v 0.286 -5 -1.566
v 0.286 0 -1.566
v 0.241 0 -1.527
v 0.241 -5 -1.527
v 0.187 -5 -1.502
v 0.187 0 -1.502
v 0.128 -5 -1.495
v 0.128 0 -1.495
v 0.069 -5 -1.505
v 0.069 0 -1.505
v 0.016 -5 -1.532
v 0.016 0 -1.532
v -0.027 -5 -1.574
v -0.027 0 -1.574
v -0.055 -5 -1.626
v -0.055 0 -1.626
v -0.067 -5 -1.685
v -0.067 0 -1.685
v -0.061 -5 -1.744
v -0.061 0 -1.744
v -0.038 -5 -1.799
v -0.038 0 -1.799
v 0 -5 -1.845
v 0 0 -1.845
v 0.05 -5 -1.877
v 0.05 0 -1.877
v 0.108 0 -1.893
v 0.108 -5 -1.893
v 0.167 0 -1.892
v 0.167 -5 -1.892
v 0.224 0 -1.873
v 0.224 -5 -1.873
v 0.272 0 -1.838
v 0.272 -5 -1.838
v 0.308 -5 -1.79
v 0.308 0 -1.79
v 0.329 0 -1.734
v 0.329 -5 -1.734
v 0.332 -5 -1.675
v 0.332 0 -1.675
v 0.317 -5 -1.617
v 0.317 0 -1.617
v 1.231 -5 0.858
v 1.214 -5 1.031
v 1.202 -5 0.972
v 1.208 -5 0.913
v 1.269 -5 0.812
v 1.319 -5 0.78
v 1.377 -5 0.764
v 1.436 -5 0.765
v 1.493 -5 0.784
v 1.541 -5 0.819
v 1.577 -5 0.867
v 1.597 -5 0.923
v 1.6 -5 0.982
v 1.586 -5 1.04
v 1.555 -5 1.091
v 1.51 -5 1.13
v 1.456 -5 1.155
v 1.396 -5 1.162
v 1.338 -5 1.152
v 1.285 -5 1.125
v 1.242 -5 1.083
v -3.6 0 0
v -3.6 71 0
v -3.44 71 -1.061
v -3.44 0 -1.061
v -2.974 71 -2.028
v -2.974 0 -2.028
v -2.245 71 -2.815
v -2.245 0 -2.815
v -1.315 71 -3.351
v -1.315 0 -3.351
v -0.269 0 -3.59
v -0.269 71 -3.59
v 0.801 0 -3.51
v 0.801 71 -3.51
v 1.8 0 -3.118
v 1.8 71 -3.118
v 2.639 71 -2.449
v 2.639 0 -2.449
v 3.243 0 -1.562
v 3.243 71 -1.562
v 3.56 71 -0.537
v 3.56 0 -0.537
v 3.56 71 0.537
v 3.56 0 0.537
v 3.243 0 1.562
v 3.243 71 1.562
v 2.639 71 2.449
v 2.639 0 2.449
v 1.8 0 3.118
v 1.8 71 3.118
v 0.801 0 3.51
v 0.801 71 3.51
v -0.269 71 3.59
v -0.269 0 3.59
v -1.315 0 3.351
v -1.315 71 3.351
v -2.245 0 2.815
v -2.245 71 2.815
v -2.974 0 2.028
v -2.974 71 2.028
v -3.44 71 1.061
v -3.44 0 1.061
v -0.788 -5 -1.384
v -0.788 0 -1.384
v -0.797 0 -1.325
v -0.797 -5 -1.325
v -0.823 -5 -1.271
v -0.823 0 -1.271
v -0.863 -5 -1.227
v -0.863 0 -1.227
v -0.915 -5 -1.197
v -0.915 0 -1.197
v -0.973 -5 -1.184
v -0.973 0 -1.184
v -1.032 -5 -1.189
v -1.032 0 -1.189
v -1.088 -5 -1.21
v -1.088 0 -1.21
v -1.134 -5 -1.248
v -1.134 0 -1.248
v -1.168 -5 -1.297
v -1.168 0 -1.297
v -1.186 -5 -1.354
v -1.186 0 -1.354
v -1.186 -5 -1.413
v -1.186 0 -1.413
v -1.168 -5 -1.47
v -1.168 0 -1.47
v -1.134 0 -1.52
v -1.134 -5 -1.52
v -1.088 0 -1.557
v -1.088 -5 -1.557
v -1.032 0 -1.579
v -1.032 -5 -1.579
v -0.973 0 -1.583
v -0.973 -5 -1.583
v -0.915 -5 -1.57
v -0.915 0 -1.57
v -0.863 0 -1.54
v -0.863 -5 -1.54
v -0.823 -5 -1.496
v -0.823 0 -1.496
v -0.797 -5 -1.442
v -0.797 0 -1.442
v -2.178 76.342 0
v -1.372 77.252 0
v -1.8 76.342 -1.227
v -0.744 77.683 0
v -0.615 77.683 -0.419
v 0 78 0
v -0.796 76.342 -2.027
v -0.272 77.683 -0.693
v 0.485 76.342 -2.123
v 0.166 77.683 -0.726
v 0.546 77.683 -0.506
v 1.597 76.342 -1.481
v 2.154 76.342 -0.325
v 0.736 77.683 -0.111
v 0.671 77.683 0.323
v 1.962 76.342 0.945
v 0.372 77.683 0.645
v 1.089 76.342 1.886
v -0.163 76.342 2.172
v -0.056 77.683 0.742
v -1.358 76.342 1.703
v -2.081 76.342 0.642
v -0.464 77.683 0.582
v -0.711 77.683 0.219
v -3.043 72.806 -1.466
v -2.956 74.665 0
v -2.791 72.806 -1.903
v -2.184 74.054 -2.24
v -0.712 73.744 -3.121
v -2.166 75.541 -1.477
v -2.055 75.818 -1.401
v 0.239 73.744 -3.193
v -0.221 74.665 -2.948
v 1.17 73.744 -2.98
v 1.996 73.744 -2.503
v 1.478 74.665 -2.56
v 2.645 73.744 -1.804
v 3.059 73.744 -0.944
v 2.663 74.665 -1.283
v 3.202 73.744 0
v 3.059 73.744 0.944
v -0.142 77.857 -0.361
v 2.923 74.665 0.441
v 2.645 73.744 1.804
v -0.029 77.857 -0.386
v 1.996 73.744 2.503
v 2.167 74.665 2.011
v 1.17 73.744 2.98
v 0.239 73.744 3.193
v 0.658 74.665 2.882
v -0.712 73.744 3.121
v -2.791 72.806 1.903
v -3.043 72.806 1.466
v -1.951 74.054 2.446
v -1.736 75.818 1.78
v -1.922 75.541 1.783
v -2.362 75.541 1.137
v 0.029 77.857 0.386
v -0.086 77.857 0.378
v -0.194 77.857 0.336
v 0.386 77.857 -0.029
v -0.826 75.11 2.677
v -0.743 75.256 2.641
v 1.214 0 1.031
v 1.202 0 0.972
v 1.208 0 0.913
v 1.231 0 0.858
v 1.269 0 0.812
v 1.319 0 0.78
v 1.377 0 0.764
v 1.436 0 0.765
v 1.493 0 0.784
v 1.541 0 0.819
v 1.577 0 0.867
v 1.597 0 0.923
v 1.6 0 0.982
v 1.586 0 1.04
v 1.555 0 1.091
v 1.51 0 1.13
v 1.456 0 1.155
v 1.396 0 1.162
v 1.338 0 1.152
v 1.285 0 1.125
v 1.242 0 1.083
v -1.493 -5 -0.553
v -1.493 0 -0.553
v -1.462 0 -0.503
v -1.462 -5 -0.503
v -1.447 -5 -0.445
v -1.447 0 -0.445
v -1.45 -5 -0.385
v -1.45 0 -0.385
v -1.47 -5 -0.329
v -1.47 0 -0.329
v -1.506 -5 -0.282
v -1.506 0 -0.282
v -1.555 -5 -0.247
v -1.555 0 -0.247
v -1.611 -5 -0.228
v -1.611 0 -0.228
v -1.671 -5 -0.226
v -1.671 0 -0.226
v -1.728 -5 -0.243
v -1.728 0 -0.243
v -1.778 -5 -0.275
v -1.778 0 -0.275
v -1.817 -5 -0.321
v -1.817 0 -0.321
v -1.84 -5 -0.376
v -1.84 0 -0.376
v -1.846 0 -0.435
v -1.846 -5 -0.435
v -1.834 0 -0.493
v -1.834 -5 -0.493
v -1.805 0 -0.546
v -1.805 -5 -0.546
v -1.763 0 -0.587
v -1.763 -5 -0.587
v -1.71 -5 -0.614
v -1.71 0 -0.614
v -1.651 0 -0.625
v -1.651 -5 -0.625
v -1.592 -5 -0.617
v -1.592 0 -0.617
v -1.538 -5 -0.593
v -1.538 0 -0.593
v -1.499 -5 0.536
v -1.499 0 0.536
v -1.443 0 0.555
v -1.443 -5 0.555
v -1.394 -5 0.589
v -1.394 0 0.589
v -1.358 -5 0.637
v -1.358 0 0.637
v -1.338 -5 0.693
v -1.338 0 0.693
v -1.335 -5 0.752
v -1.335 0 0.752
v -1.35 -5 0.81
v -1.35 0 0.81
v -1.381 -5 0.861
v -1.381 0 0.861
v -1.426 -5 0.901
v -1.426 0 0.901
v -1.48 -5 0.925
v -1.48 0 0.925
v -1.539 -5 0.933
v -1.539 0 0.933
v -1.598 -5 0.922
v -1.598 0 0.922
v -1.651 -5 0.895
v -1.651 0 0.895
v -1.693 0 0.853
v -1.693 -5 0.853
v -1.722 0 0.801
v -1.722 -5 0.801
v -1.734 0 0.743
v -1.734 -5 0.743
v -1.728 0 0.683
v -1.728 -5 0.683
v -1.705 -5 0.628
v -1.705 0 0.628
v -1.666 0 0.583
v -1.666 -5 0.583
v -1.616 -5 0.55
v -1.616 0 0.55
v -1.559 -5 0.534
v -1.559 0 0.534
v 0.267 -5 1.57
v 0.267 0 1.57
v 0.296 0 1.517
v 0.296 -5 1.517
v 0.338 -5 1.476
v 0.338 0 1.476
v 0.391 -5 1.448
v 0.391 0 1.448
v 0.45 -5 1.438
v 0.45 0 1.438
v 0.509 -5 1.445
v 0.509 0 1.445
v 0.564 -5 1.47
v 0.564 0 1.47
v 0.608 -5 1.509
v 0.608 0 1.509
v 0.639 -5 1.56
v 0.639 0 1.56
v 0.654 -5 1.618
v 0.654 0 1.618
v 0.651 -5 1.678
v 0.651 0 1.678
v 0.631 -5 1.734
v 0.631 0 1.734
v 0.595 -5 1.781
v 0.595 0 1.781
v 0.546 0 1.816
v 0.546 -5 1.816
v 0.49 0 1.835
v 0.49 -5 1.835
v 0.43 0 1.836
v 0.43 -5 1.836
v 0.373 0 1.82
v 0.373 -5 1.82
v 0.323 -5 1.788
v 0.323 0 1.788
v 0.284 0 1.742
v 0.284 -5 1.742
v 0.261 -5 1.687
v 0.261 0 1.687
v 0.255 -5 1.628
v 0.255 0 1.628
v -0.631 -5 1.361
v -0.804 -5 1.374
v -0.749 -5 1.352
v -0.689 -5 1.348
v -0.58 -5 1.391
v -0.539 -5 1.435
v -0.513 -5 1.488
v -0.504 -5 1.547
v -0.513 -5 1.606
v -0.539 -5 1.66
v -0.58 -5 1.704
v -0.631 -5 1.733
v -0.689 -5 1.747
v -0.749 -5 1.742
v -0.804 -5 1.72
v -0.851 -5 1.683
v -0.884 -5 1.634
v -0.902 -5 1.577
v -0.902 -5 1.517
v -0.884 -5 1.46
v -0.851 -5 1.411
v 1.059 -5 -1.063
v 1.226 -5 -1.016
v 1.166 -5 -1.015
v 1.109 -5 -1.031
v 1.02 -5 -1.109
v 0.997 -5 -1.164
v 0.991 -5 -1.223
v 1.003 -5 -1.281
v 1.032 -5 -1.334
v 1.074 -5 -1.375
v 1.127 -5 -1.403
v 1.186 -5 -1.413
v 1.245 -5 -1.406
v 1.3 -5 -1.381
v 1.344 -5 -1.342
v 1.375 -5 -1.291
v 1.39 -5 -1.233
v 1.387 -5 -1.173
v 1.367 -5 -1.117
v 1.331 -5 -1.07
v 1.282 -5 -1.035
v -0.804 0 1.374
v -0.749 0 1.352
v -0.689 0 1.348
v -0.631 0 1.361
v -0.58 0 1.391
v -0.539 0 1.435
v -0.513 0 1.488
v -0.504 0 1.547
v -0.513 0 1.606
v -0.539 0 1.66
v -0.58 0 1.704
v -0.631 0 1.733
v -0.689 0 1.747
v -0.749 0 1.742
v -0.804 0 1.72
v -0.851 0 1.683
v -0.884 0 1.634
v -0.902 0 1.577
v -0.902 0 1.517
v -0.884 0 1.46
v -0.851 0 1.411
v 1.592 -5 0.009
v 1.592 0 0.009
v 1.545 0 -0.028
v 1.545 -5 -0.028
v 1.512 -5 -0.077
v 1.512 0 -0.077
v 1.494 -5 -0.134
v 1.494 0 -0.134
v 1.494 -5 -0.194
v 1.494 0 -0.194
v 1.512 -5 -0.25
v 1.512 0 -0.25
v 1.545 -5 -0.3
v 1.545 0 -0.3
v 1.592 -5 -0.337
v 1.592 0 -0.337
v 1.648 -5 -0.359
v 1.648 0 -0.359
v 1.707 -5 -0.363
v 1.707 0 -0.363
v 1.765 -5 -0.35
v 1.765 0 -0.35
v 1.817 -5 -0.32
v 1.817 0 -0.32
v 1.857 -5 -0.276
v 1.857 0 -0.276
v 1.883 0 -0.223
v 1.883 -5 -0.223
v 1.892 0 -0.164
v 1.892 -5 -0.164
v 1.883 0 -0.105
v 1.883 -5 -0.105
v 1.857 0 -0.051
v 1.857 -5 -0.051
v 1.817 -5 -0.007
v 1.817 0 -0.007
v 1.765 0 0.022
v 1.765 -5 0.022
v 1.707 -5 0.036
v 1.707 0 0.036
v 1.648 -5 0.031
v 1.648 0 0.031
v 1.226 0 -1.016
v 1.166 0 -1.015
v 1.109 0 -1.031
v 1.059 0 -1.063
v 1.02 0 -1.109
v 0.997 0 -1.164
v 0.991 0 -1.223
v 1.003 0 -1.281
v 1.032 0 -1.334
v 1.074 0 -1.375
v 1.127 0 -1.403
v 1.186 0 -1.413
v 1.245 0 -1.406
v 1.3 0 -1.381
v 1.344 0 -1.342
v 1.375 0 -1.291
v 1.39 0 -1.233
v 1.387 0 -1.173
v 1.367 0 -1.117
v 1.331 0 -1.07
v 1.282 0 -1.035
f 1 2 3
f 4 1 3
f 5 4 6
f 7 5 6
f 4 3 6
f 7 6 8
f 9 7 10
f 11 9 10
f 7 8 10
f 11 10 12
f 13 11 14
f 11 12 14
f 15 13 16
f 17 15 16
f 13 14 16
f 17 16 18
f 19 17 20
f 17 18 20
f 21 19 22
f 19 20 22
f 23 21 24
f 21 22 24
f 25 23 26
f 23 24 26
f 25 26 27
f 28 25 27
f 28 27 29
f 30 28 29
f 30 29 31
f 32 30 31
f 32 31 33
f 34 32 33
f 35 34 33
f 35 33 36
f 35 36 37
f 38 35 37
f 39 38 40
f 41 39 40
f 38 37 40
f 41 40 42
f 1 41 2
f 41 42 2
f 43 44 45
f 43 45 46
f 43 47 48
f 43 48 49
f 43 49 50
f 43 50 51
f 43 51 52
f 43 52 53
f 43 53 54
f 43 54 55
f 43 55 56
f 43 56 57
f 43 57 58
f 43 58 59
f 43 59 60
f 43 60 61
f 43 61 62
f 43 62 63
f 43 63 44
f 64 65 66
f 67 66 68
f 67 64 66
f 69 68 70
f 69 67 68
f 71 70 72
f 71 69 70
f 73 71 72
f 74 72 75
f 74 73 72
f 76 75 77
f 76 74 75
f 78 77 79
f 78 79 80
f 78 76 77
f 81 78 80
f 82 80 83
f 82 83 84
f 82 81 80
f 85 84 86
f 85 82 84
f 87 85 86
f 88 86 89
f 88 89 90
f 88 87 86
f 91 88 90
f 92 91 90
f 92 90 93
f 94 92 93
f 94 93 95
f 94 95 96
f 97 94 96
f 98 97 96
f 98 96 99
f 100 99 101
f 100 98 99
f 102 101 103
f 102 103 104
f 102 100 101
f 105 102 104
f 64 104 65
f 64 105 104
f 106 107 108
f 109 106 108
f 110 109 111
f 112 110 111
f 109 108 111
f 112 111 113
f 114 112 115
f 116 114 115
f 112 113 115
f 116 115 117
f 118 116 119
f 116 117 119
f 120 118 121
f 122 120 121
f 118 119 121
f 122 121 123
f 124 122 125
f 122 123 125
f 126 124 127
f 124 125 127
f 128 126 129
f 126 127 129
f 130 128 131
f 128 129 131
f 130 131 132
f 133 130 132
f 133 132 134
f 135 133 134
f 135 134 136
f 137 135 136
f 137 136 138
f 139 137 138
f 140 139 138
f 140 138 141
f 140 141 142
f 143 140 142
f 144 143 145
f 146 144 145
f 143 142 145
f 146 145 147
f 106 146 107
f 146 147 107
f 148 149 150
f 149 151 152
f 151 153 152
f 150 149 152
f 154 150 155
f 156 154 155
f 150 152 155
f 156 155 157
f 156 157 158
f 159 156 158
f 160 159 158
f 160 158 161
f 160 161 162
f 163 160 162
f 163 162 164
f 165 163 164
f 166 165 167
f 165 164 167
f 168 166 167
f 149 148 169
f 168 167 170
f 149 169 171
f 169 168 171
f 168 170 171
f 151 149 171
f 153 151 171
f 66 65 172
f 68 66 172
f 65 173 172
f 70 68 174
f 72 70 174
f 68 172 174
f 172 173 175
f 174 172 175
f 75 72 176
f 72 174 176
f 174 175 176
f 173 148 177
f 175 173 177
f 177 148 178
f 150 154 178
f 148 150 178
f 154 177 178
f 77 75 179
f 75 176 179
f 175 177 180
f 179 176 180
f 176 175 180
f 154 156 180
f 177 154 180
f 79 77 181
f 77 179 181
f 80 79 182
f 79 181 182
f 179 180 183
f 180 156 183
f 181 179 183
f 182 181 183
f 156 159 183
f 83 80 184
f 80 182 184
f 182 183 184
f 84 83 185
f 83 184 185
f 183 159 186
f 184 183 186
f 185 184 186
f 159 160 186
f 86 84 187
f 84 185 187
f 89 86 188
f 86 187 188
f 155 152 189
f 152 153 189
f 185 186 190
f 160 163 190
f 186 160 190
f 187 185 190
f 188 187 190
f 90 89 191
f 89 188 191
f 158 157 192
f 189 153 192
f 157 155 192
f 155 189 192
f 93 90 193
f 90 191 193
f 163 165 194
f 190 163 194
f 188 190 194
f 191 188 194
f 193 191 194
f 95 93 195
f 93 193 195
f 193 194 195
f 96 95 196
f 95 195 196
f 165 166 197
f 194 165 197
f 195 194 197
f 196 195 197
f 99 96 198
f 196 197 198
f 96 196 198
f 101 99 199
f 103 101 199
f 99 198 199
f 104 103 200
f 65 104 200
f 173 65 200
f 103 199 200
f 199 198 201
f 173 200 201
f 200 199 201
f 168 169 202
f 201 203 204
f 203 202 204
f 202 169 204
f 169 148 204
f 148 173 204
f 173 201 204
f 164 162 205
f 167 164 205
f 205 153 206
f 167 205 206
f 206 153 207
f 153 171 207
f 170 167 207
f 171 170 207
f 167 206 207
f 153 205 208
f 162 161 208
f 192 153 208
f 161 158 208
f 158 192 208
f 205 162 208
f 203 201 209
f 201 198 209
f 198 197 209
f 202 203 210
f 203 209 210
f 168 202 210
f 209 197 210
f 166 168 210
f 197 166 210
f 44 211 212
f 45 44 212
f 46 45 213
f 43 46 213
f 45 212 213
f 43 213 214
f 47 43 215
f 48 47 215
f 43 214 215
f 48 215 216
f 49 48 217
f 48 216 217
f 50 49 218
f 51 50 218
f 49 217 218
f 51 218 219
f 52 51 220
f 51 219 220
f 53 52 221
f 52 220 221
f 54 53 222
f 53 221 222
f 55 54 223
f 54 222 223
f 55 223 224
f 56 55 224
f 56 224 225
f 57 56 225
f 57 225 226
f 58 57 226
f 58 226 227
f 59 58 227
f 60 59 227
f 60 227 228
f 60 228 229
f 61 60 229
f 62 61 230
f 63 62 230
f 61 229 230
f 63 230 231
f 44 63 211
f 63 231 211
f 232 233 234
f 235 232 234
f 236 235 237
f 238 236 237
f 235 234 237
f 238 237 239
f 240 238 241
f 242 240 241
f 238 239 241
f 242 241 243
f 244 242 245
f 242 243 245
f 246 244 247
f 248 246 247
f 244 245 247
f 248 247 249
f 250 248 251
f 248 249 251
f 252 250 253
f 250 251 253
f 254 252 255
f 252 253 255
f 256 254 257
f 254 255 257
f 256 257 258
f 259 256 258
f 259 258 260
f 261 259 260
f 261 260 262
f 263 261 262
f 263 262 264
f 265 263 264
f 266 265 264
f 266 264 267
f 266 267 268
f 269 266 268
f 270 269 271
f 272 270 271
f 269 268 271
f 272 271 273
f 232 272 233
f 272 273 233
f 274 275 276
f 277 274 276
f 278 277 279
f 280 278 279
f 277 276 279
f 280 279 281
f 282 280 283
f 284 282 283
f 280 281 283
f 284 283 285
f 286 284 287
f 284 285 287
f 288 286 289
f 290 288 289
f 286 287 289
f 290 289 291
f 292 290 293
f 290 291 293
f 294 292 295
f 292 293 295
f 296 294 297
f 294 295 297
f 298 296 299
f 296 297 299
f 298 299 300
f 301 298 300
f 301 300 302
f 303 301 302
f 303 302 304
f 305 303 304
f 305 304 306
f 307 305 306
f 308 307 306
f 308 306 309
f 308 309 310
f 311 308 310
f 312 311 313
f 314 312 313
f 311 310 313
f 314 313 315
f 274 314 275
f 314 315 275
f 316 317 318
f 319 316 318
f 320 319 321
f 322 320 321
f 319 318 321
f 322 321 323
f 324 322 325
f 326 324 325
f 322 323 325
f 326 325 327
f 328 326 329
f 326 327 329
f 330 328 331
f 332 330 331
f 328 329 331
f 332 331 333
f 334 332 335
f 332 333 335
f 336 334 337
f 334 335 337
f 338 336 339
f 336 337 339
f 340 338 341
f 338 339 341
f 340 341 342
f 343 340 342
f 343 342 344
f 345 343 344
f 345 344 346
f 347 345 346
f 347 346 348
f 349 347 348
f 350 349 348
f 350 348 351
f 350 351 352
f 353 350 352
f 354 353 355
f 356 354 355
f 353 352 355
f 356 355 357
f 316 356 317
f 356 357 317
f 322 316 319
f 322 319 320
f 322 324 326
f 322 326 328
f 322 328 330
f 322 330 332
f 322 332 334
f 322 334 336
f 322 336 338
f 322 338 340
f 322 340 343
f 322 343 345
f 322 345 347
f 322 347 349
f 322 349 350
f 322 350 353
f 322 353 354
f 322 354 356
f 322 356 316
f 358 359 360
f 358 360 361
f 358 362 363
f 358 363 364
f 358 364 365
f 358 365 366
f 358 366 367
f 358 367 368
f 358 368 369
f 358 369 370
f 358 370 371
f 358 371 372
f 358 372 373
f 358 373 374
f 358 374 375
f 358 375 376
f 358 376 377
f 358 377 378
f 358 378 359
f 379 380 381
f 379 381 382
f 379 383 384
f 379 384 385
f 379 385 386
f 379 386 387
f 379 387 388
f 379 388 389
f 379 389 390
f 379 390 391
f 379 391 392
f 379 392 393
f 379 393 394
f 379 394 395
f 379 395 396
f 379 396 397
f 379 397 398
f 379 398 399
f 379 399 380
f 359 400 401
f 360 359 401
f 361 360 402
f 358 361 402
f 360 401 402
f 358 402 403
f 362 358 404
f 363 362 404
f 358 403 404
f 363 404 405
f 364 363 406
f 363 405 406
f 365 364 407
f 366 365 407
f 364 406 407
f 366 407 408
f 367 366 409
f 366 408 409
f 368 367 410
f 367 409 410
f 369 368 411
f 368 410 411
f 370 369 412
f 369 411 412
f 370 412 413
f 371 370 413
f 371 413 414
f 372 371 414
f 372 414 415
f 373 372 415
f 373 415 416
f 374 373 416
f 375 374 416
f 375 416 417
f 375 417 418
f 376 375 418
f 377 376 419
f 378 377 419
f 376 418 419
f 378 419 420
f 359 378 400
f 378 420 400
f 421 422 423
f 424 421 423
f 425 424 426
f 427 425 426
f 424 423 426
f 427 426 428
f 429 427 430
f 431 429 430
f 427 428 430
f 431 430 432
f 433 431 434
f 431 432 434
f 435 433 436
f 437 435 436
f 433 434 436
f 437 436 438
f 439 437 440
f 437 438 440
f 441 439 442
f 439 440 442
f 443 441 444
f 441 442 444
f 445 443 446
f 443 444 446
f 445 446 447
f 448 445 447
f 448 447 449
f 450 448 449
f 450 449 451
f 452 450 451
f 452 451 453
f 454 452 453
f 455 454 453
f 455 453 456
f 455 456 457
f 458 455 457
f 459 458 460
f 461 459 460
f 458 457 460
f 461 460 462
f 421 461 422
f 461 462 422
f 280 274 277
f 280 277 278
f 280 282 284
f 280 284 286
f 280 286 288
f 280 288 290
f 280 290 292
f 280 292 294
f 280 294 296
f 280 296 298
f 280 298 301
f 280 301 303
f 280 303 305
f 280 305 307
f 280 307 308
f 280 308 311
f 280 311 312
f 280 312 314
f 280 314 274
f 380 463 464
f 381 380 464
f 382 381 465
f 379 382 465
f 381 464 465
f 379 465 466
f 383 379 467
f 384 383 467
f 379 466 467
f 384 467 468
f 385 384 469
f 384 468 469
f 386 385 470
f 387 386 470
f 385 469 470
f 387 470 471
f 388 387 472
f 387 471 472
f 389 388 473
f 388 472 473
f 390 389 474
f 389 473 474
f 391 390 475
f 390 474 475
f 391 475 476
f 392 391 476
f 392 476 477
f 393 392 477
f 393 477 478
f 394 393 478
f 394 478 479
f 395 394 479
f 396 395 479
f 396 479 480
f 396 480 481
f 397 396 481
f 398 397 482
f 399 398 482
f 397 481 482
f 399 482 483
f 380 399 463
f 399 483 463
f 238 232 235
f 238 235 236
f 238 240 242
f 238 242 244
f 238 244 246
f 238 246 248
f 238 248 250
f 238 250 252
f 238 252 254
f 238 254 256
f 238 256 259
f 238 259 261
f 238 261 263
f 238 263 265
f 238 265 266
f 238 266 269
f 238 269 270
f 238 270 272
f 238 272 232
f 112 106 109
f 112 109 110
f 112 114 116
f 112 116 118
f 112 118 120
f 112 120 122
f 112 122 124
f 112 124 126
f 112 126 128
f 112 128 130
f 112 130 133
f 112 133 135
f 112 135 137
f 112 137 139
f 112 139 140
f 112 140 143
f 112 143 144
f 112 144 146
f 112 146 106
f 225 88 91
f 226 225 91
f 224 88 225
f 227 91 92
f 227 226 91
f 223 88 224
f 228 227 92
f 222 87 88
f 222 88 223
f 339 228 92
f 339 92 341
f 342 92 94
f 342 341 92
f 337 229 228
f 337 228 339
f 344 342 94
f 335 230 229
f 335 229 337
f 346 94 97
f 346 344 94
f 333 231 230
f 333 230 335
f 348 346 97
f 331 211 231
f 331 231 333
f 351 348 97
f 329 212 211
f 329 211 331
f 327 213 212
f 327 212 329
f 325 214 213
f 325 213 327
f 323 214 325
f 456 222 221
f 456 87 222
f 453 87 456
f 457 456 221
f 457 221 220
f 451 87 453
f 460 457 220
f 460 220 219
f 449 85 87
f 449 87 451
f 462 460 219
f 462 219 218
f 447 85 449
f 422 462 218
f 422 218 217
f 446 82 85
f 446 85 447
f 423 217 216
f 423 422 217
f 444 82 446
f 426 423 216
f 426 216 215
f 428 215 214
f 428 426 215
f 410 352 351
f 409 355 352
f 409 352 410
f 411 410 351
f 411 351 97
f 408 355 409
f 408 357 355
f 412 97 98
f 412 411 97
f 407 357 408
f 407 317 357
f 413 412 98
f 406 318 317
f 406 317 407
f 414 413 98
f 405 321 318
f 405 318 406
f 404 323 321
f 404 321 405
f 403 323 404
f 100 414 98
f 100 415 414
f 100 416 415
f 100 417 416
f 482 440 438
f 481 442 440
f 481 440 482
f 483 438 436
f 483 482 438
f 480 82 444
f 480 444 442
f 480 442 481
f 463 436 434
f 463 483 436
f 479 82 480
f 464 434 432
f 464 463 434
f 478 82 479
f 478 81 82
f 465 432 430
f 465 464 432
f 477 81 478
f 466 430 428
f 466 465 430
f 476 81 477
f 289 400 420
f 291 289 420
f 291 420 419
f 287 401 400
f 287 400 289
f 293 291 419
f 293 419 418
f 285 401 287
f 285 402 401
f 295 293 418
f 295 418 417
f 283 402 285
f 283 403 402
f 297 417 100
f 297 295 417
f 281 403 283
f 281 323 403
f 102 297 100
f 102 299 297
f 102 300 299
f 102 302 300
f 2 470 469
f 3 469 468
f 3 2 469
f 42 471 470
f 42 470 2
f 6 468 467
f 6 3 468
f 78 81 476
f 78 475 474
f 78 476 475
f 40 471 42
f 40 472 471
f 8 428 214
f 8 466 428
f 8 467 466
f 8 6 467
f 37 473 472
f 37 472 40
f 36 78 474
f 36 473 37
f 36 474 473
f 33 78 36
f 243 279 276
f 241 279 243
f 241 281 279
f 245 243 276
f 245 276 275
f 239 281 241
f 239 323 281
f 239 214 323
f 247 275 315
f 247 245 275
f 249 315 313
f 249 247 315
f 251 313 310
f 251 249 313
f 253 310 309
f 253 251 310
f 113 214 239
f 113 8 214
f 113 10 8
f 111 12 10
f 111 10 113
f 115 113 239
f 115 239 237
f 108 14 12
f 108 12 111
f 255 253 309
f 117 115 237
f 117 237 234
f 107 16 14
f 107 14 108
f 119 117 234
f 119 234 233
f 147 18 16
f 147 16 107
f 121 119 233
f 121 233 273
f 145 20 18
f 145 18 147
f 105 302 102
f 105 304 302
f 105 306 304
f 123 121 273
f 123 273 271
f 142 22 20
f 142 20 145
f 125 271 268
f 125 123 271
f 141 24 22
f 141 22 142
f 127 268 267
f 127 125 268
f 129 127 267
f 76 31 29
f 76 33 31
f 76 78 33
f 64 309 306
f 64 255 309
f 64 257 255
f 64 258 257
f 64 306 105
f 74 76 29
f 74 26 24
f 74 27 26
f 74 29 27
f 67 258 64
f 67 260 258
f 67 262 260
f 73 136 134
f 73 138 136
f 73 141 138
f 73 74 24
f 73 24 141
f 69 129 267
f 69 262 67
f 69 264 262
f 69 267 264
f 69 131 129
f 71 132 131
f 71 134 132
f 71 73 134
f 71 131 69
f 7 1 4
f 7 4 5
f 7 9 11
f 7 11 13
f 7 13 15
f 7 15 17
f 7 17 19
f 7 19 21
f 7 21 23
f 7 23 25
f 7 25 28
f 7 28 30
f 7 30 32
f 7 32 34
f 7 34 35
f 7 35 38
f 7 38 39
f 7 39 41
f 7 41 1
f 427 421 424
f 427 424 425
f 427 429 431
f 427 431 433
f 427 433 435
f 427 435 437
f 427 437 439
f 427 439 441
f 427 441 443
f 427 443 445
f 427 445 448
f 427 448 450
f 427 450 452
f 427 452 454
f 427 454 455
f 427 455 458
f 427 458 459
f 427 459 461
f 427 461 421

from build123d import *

# Parameters (mm, degrees)
SKETCH_2_R               = 0.2
EXTRUDE_1_DEPTH          = 5
PATTERN_CIRCULAR_1_COUNT = 9


with BuildPart() as part:
    # 草图1 → 旋转1 (revolve)
    with BuildSketch(Plane.XY):
        with BuildLine():
            Line((-3.6, 71), (-3.6, 0))
            Line((-3.6, 0), (0, 0))
            Line((0, 0), (0, 78))
            add(Edge.make_bspline(
                [(-3.6, 71), (-3.337937783, 73.551680107), (-2.931620403, 77.076293538), (0, 78)],
                knots=[0, 0, 0, 0, 1, 1, 1, 1], degree=3))
        make_face()
    revolve(axis=Axis((0, 8.263328558, 0), (0, -1, 0)))

    # 草图2 → 凸台-拉伸1 (add)
    with BuildSketch(Plane.XZ):
        with Locations((-0.987826351, -1.383545843)):
            Circle(SKETCH_2_R)
    extrude_1 = extrude(amount=EXTRUDE_1_DEPTH)

    # 阵列(圆周)1: 凸台-拉伸1 ×9 about axis
    pattern_circular_1_axis = Axis((0, 0, 0), (0, 1, 0))
    for i in range(1, PATTERN_CIRCULAR_1_COUNT):
        add(extrude_1.rotate(pattern_circular_1_axis, i * 360 / PATTERN_CIRCULAR_1_COUNT))


solid = part.part
